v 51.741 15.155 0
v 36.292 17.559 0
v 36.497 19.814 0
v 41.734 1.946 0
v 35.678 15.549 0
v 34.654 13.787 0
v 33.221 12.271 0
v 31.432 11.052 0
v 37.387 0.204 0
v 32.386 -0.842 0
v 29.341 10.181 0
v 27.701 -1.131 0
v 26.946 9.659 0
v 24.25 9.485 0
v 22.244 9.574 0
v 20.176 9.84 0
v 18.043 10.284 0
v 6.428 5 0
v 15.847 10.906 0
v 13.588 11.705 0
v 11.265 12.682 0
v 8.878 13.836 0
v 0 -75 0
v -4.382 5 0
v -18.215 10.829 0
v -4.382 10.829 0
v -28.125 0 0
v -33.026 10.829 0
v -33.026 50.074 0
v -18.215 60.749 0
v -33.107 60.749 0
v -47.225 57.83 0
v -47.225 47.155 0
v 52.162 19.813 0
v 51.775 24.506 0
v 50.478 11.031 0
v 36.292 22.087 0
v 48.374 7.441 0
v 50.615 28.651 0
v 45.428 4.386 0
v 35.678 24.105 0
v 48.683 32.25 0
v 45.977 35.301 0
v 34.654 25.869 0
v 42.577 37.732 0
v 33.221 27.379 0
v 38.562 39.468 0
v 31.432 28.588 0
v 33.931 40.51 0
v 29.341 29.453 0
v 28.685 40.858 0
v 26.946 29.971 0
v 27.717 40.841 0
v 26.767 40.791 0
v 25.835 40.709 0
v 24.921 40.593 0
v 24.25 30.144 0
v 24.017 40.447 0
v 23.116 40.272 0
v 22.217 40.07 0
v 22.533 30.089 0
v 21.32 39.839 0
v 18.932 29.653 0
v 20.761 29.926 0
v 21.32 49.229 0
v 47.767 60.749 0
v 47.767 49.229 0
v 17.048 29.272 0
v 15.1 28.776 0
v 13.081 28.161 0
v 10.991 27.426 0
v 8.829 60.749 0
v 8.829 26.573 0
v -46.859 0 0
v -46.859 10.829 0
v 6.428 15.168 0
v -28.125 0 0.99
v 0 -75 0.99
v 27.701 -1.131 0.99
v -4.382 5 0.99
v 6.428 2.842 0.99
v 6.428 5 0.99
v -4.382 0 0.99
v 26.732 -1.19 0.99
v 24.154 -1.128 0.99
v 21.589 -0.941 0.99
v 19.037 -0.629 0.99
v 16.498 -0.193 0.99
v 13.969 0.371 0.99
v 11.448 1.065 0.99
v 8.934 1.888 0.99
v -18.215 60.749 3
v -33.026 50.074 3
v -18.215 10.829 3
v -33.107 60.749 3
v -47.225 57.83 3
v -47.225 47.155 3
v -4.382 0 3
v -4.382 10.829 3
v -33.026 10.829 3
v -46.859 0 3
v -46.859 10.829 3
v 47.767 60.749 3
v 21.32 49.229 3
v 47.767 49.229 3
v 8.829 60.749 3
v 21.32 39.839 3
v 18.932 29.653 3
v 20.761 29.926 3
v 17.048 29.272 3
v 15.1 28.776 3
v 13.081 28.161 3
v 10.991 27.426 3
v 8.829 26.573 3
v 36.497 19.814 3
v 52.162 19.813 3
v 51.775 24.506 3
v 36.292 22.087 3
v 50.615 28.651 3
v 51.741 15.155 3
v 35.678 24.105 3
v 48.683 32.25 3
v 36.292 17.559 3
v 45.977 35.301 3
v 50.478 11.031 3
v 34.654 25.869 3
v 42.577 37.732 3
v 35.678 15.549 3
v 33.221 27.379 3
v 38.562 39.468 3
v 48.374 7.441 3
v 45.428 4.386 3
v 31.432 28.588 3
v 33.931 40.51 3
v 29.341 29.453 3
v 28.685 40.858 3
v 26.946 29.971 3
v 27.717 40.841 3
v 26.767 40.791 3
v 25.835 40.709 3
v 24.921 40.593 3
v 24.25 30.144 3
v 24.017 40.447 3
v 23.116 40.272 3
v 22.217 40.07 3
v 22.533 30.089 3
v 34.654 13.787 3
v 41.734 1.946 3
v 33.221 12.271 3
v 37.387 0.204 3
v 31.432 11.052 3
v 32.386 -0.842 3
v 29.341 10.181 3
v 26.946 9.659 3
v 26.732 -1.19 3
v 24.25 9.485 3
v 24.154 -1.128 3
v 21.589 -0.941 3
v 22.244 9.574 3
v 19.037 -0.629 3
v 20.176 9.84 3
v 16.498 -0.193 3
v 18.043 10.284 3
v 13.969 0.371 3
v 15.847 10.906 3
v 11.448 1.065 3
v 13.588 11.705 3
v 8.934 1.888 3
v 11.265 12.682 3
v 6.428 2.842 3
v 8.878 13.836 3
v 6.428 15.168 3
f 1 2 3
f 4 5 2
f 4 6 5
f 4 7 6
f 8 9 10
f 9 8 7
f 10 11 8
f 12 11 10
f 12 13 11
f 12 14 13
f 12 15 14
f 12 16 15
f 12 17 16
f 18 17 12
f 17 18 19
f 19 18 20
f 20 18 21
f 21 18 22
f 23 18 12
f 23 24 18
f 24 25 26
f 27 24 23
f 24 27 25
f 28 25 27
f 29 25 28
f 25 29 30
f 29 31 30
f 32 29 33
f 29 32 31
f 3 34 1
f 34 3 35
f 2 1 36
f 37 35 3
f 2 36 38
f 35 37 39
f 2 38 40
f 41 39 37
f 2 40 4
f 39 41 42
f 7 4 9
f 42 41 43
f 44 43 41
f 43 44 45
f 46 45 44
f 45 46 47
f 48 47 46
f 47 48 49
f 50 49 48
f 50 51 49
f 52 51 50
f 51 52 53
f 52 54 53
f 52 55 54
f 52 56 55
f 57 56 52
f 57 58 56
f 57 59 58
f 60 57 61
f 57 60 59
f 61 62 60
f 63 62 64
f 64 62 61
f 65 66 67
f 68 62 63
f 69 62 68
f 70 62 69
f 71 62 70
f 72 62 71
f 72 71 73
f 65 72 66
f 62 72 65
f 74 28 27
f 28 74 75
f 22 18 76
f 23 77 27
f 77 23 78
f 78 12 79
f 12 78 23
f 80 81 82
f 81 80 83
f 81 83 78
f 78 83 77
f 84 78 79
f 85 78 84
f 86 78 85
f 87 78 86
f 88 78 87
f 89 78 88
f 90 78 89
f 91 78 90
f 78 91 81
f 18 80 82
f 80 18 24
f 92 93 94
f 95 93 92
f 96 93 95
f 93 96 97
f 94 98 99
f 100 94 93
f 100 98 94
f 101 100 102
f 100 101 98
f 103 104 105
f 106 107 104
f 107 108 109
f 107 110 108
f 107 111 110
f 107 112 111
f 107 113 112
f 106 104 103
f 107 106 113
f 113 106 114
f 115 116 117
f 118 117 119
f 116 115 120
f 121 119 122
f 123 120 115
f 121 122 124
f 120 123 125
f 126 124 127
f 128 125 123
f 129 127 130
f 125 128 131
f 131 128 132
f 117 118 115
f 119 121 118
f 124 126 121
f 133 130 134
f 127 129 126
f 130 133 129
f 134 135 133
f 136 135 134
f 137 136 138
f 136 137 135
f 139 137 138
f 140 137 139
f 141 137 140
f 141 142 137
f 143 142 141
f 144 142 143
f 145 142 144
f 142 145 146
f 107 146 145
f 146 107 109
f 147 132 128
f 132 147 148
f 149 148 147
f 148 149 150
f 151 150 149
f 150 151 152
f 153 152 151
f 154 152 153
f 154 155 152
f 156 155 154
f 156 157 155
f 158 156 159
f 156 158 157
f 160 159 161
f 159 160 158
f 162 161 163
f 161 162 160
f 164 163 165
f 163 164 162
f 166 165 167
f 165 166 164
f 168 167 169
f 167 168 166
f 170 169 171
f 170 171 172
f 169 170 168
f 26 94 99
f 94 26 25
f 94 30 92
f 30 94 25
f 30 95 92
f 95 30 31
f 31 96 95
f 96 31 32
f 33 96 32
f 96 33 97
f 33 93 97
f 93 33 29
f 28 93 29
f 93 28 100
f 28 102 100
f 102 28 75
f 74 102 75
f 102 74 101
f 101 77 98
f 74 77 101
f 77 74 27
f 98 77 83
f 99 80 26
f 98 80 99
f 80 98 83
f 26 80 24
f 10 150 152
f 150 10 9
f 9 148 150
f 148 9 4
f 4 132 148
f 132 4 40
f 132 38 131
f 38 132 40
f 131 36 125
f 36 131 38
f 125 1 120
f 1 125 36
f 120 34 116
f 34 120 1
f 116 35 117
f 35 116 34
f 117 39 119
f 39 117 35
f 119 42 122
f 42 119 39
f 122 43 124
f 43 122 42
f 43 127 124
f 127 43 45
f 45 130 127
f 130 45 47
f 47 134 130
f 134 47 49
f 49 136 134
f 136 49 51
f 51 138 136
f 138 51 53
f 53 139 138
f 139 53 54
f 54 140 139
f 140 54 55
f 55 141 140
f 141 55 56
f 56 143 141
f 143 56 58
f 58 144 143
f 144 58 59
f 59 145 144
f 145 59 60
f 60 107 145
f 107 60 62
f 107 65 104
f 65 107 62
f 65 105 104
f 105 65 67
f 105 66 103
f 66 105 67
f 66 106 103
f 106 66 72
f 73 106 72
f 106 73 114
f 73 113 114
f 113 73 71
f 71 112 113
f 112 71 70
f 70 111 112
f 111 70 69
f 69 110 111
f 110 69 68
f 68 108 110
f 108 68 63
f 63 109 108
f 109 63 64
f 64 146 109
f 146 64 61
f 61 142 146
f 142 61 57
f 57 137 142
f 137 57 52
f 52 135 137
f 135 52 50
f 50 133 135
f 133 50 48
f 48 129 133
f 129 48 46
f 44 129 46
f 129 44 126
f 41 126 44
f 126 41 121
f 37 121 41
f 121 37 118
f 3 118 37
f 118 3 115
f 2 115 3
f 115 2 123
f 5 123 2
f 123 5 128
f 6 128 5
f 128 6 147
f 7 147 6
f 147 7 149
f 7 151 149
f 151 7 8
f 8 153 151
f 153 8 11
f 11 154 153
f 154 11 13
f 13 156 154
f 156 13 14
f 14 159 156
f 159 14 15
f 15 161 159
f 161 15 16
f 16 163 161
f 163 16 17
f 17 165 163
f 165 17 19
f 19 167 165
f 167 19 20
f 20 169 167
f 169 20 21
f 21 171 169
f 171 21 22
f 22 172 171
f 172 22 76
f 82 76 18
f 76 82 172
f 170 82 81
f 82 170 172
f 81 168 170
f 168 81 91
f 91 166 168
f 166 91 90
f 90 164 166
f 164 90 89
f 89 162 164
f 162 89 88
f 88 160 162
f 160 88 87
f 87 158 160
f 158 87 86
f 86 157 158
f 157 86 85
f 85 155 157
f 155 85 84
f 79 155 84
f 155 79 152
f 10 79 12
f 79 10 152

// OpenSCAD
font="Bitstream Vera Sans:style=Bold";
//font="Titan One";
//font="Baskerville:style=Bold";
text_on_flat="15";
//text_on_flat2="Kingi";
text_size=80;
depth=3;
spacing=1;

frame_z_offset = 0.5*text_size;

frame_width=10;
frame_depth=20;
frame_cover_overlap=frame_width*0.8;
picture_overlap=frame_width-frame_cover_overlap;

picture_x=100;
picture_z=150;
picture_depth=0.5*frame_depth;

cover_spacing=0.4;
cover_wall_width=0.8;
cover_depth_multiplier=0.8;

module the_bar(length) {
  bar_depth = 0.33*depth;
  translate([0, 0, 0.5*bar_depth]) cube([length, 0.1*text_size, bar_depth], center=true);
}


module the_text(text, size) {
linear_extrude(height=depth, convexity=4)
    text(text, 
         size=size,
         font=font,
         halign="center",
         spacing=spacing);
}

module the_text_with_bar(text, size, length) {
linear_extrude(height=depth, convexity=4)
    text(text, 
         size=size,
         font=font,
         halign="center",
         spacing=spacing);
  the_bar(length);
}

module ibar(width, length) {
  cube([width, length, 0.33*depth]);
}


translate([0, 5, 0]) linear_extrude(0.33*depth) polygon([[-30,0],[30,0],[0,-80]]);
the_text(text_on_flat, 60);
//translate([0, -50, 0]) the_text_with_bar(text_on_flat, 60, 50);
//the_frame();
//cover();
//translate([29.8, 18, 0]) ibar(6,6);
//translate([48.3, -29.5, 0]) ibar(7.35,7);
//translate([-23.8, -29.5, 0]) ibar(7.35,7);
